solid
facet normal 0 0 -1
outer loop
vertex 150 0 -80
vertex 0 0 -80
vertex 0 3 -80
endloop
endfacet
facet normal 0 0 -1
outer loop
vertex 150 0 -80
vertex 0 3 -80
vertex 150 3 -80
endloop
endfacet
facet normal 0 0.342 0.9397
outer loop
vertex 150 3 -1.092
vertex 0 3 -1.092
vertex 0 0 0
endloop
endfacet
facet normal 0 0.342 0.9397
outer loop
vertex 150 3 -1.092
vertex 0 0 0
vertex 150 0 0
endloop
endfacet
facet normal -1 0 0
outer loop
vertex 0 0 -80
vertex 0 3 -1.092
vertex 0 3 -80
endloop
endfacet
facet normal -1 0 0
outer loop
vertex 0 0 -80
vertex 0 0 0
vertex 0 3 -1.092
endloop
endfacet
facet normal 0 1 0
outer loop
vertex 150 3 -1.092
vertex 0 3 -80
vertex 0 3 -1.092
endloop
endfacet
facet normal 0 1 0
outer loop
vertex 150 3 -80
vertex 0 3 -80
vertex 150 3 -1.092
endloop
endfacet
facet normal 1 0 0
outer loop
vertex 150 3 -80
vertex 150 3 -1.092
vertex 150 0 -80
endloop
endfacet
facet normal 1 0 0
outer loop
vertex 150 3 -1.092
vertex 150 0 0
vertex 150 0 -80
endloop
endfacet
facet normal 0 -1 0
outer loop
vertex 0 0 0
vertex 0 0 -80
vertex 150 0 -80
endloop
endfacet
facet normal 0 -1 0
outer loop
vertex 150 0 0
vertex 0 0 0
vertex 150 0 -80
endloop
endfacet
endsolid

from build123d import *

# Parameters (mm, degrees)
ESQUISSE1_W        = 150
ESQUISSE1_H        = 80
BOSS_EXTRU_1_DEPTH = 3
CHANFREIN2_SIZE2   = 1.091910703
CHANFREIN2_SIZE    = 3


with BuildPart() as part:
    # Esquisse1 → Boss.-Extru.1 (new body)
    with BuildSketch(Plane(origin=(0, 0, 0), x_dir=(1, 0, 0), z_dir=(0, 1, 0))):
        with Locations((75, 40)):
            Rectangle(ESQUISSE1_W, ESQUISSE1_H)
    extrude(amount=BOSS_EXTRU_1_DEPTH)

    # Chanfrein2
    chanfrein2_edges = [part.edges().sort_by_distance(p)[0] for p in [
        (75, 3, 0),
    ]]
    chanfrein2_side = [part.faces().sort_by_distance(p)[0] for p in [
        (75, 2.978161786, 0),
    ]]
    chamfer(chanfrein2_edges, length=CHANFREIN2_SIZE - 0.0001, length2=CHANFREIN2_SIZE2 - 0.0001, reference=chanfrein2_side[0])  # a hair under: the kernel refuses the full size


solid = part.part
